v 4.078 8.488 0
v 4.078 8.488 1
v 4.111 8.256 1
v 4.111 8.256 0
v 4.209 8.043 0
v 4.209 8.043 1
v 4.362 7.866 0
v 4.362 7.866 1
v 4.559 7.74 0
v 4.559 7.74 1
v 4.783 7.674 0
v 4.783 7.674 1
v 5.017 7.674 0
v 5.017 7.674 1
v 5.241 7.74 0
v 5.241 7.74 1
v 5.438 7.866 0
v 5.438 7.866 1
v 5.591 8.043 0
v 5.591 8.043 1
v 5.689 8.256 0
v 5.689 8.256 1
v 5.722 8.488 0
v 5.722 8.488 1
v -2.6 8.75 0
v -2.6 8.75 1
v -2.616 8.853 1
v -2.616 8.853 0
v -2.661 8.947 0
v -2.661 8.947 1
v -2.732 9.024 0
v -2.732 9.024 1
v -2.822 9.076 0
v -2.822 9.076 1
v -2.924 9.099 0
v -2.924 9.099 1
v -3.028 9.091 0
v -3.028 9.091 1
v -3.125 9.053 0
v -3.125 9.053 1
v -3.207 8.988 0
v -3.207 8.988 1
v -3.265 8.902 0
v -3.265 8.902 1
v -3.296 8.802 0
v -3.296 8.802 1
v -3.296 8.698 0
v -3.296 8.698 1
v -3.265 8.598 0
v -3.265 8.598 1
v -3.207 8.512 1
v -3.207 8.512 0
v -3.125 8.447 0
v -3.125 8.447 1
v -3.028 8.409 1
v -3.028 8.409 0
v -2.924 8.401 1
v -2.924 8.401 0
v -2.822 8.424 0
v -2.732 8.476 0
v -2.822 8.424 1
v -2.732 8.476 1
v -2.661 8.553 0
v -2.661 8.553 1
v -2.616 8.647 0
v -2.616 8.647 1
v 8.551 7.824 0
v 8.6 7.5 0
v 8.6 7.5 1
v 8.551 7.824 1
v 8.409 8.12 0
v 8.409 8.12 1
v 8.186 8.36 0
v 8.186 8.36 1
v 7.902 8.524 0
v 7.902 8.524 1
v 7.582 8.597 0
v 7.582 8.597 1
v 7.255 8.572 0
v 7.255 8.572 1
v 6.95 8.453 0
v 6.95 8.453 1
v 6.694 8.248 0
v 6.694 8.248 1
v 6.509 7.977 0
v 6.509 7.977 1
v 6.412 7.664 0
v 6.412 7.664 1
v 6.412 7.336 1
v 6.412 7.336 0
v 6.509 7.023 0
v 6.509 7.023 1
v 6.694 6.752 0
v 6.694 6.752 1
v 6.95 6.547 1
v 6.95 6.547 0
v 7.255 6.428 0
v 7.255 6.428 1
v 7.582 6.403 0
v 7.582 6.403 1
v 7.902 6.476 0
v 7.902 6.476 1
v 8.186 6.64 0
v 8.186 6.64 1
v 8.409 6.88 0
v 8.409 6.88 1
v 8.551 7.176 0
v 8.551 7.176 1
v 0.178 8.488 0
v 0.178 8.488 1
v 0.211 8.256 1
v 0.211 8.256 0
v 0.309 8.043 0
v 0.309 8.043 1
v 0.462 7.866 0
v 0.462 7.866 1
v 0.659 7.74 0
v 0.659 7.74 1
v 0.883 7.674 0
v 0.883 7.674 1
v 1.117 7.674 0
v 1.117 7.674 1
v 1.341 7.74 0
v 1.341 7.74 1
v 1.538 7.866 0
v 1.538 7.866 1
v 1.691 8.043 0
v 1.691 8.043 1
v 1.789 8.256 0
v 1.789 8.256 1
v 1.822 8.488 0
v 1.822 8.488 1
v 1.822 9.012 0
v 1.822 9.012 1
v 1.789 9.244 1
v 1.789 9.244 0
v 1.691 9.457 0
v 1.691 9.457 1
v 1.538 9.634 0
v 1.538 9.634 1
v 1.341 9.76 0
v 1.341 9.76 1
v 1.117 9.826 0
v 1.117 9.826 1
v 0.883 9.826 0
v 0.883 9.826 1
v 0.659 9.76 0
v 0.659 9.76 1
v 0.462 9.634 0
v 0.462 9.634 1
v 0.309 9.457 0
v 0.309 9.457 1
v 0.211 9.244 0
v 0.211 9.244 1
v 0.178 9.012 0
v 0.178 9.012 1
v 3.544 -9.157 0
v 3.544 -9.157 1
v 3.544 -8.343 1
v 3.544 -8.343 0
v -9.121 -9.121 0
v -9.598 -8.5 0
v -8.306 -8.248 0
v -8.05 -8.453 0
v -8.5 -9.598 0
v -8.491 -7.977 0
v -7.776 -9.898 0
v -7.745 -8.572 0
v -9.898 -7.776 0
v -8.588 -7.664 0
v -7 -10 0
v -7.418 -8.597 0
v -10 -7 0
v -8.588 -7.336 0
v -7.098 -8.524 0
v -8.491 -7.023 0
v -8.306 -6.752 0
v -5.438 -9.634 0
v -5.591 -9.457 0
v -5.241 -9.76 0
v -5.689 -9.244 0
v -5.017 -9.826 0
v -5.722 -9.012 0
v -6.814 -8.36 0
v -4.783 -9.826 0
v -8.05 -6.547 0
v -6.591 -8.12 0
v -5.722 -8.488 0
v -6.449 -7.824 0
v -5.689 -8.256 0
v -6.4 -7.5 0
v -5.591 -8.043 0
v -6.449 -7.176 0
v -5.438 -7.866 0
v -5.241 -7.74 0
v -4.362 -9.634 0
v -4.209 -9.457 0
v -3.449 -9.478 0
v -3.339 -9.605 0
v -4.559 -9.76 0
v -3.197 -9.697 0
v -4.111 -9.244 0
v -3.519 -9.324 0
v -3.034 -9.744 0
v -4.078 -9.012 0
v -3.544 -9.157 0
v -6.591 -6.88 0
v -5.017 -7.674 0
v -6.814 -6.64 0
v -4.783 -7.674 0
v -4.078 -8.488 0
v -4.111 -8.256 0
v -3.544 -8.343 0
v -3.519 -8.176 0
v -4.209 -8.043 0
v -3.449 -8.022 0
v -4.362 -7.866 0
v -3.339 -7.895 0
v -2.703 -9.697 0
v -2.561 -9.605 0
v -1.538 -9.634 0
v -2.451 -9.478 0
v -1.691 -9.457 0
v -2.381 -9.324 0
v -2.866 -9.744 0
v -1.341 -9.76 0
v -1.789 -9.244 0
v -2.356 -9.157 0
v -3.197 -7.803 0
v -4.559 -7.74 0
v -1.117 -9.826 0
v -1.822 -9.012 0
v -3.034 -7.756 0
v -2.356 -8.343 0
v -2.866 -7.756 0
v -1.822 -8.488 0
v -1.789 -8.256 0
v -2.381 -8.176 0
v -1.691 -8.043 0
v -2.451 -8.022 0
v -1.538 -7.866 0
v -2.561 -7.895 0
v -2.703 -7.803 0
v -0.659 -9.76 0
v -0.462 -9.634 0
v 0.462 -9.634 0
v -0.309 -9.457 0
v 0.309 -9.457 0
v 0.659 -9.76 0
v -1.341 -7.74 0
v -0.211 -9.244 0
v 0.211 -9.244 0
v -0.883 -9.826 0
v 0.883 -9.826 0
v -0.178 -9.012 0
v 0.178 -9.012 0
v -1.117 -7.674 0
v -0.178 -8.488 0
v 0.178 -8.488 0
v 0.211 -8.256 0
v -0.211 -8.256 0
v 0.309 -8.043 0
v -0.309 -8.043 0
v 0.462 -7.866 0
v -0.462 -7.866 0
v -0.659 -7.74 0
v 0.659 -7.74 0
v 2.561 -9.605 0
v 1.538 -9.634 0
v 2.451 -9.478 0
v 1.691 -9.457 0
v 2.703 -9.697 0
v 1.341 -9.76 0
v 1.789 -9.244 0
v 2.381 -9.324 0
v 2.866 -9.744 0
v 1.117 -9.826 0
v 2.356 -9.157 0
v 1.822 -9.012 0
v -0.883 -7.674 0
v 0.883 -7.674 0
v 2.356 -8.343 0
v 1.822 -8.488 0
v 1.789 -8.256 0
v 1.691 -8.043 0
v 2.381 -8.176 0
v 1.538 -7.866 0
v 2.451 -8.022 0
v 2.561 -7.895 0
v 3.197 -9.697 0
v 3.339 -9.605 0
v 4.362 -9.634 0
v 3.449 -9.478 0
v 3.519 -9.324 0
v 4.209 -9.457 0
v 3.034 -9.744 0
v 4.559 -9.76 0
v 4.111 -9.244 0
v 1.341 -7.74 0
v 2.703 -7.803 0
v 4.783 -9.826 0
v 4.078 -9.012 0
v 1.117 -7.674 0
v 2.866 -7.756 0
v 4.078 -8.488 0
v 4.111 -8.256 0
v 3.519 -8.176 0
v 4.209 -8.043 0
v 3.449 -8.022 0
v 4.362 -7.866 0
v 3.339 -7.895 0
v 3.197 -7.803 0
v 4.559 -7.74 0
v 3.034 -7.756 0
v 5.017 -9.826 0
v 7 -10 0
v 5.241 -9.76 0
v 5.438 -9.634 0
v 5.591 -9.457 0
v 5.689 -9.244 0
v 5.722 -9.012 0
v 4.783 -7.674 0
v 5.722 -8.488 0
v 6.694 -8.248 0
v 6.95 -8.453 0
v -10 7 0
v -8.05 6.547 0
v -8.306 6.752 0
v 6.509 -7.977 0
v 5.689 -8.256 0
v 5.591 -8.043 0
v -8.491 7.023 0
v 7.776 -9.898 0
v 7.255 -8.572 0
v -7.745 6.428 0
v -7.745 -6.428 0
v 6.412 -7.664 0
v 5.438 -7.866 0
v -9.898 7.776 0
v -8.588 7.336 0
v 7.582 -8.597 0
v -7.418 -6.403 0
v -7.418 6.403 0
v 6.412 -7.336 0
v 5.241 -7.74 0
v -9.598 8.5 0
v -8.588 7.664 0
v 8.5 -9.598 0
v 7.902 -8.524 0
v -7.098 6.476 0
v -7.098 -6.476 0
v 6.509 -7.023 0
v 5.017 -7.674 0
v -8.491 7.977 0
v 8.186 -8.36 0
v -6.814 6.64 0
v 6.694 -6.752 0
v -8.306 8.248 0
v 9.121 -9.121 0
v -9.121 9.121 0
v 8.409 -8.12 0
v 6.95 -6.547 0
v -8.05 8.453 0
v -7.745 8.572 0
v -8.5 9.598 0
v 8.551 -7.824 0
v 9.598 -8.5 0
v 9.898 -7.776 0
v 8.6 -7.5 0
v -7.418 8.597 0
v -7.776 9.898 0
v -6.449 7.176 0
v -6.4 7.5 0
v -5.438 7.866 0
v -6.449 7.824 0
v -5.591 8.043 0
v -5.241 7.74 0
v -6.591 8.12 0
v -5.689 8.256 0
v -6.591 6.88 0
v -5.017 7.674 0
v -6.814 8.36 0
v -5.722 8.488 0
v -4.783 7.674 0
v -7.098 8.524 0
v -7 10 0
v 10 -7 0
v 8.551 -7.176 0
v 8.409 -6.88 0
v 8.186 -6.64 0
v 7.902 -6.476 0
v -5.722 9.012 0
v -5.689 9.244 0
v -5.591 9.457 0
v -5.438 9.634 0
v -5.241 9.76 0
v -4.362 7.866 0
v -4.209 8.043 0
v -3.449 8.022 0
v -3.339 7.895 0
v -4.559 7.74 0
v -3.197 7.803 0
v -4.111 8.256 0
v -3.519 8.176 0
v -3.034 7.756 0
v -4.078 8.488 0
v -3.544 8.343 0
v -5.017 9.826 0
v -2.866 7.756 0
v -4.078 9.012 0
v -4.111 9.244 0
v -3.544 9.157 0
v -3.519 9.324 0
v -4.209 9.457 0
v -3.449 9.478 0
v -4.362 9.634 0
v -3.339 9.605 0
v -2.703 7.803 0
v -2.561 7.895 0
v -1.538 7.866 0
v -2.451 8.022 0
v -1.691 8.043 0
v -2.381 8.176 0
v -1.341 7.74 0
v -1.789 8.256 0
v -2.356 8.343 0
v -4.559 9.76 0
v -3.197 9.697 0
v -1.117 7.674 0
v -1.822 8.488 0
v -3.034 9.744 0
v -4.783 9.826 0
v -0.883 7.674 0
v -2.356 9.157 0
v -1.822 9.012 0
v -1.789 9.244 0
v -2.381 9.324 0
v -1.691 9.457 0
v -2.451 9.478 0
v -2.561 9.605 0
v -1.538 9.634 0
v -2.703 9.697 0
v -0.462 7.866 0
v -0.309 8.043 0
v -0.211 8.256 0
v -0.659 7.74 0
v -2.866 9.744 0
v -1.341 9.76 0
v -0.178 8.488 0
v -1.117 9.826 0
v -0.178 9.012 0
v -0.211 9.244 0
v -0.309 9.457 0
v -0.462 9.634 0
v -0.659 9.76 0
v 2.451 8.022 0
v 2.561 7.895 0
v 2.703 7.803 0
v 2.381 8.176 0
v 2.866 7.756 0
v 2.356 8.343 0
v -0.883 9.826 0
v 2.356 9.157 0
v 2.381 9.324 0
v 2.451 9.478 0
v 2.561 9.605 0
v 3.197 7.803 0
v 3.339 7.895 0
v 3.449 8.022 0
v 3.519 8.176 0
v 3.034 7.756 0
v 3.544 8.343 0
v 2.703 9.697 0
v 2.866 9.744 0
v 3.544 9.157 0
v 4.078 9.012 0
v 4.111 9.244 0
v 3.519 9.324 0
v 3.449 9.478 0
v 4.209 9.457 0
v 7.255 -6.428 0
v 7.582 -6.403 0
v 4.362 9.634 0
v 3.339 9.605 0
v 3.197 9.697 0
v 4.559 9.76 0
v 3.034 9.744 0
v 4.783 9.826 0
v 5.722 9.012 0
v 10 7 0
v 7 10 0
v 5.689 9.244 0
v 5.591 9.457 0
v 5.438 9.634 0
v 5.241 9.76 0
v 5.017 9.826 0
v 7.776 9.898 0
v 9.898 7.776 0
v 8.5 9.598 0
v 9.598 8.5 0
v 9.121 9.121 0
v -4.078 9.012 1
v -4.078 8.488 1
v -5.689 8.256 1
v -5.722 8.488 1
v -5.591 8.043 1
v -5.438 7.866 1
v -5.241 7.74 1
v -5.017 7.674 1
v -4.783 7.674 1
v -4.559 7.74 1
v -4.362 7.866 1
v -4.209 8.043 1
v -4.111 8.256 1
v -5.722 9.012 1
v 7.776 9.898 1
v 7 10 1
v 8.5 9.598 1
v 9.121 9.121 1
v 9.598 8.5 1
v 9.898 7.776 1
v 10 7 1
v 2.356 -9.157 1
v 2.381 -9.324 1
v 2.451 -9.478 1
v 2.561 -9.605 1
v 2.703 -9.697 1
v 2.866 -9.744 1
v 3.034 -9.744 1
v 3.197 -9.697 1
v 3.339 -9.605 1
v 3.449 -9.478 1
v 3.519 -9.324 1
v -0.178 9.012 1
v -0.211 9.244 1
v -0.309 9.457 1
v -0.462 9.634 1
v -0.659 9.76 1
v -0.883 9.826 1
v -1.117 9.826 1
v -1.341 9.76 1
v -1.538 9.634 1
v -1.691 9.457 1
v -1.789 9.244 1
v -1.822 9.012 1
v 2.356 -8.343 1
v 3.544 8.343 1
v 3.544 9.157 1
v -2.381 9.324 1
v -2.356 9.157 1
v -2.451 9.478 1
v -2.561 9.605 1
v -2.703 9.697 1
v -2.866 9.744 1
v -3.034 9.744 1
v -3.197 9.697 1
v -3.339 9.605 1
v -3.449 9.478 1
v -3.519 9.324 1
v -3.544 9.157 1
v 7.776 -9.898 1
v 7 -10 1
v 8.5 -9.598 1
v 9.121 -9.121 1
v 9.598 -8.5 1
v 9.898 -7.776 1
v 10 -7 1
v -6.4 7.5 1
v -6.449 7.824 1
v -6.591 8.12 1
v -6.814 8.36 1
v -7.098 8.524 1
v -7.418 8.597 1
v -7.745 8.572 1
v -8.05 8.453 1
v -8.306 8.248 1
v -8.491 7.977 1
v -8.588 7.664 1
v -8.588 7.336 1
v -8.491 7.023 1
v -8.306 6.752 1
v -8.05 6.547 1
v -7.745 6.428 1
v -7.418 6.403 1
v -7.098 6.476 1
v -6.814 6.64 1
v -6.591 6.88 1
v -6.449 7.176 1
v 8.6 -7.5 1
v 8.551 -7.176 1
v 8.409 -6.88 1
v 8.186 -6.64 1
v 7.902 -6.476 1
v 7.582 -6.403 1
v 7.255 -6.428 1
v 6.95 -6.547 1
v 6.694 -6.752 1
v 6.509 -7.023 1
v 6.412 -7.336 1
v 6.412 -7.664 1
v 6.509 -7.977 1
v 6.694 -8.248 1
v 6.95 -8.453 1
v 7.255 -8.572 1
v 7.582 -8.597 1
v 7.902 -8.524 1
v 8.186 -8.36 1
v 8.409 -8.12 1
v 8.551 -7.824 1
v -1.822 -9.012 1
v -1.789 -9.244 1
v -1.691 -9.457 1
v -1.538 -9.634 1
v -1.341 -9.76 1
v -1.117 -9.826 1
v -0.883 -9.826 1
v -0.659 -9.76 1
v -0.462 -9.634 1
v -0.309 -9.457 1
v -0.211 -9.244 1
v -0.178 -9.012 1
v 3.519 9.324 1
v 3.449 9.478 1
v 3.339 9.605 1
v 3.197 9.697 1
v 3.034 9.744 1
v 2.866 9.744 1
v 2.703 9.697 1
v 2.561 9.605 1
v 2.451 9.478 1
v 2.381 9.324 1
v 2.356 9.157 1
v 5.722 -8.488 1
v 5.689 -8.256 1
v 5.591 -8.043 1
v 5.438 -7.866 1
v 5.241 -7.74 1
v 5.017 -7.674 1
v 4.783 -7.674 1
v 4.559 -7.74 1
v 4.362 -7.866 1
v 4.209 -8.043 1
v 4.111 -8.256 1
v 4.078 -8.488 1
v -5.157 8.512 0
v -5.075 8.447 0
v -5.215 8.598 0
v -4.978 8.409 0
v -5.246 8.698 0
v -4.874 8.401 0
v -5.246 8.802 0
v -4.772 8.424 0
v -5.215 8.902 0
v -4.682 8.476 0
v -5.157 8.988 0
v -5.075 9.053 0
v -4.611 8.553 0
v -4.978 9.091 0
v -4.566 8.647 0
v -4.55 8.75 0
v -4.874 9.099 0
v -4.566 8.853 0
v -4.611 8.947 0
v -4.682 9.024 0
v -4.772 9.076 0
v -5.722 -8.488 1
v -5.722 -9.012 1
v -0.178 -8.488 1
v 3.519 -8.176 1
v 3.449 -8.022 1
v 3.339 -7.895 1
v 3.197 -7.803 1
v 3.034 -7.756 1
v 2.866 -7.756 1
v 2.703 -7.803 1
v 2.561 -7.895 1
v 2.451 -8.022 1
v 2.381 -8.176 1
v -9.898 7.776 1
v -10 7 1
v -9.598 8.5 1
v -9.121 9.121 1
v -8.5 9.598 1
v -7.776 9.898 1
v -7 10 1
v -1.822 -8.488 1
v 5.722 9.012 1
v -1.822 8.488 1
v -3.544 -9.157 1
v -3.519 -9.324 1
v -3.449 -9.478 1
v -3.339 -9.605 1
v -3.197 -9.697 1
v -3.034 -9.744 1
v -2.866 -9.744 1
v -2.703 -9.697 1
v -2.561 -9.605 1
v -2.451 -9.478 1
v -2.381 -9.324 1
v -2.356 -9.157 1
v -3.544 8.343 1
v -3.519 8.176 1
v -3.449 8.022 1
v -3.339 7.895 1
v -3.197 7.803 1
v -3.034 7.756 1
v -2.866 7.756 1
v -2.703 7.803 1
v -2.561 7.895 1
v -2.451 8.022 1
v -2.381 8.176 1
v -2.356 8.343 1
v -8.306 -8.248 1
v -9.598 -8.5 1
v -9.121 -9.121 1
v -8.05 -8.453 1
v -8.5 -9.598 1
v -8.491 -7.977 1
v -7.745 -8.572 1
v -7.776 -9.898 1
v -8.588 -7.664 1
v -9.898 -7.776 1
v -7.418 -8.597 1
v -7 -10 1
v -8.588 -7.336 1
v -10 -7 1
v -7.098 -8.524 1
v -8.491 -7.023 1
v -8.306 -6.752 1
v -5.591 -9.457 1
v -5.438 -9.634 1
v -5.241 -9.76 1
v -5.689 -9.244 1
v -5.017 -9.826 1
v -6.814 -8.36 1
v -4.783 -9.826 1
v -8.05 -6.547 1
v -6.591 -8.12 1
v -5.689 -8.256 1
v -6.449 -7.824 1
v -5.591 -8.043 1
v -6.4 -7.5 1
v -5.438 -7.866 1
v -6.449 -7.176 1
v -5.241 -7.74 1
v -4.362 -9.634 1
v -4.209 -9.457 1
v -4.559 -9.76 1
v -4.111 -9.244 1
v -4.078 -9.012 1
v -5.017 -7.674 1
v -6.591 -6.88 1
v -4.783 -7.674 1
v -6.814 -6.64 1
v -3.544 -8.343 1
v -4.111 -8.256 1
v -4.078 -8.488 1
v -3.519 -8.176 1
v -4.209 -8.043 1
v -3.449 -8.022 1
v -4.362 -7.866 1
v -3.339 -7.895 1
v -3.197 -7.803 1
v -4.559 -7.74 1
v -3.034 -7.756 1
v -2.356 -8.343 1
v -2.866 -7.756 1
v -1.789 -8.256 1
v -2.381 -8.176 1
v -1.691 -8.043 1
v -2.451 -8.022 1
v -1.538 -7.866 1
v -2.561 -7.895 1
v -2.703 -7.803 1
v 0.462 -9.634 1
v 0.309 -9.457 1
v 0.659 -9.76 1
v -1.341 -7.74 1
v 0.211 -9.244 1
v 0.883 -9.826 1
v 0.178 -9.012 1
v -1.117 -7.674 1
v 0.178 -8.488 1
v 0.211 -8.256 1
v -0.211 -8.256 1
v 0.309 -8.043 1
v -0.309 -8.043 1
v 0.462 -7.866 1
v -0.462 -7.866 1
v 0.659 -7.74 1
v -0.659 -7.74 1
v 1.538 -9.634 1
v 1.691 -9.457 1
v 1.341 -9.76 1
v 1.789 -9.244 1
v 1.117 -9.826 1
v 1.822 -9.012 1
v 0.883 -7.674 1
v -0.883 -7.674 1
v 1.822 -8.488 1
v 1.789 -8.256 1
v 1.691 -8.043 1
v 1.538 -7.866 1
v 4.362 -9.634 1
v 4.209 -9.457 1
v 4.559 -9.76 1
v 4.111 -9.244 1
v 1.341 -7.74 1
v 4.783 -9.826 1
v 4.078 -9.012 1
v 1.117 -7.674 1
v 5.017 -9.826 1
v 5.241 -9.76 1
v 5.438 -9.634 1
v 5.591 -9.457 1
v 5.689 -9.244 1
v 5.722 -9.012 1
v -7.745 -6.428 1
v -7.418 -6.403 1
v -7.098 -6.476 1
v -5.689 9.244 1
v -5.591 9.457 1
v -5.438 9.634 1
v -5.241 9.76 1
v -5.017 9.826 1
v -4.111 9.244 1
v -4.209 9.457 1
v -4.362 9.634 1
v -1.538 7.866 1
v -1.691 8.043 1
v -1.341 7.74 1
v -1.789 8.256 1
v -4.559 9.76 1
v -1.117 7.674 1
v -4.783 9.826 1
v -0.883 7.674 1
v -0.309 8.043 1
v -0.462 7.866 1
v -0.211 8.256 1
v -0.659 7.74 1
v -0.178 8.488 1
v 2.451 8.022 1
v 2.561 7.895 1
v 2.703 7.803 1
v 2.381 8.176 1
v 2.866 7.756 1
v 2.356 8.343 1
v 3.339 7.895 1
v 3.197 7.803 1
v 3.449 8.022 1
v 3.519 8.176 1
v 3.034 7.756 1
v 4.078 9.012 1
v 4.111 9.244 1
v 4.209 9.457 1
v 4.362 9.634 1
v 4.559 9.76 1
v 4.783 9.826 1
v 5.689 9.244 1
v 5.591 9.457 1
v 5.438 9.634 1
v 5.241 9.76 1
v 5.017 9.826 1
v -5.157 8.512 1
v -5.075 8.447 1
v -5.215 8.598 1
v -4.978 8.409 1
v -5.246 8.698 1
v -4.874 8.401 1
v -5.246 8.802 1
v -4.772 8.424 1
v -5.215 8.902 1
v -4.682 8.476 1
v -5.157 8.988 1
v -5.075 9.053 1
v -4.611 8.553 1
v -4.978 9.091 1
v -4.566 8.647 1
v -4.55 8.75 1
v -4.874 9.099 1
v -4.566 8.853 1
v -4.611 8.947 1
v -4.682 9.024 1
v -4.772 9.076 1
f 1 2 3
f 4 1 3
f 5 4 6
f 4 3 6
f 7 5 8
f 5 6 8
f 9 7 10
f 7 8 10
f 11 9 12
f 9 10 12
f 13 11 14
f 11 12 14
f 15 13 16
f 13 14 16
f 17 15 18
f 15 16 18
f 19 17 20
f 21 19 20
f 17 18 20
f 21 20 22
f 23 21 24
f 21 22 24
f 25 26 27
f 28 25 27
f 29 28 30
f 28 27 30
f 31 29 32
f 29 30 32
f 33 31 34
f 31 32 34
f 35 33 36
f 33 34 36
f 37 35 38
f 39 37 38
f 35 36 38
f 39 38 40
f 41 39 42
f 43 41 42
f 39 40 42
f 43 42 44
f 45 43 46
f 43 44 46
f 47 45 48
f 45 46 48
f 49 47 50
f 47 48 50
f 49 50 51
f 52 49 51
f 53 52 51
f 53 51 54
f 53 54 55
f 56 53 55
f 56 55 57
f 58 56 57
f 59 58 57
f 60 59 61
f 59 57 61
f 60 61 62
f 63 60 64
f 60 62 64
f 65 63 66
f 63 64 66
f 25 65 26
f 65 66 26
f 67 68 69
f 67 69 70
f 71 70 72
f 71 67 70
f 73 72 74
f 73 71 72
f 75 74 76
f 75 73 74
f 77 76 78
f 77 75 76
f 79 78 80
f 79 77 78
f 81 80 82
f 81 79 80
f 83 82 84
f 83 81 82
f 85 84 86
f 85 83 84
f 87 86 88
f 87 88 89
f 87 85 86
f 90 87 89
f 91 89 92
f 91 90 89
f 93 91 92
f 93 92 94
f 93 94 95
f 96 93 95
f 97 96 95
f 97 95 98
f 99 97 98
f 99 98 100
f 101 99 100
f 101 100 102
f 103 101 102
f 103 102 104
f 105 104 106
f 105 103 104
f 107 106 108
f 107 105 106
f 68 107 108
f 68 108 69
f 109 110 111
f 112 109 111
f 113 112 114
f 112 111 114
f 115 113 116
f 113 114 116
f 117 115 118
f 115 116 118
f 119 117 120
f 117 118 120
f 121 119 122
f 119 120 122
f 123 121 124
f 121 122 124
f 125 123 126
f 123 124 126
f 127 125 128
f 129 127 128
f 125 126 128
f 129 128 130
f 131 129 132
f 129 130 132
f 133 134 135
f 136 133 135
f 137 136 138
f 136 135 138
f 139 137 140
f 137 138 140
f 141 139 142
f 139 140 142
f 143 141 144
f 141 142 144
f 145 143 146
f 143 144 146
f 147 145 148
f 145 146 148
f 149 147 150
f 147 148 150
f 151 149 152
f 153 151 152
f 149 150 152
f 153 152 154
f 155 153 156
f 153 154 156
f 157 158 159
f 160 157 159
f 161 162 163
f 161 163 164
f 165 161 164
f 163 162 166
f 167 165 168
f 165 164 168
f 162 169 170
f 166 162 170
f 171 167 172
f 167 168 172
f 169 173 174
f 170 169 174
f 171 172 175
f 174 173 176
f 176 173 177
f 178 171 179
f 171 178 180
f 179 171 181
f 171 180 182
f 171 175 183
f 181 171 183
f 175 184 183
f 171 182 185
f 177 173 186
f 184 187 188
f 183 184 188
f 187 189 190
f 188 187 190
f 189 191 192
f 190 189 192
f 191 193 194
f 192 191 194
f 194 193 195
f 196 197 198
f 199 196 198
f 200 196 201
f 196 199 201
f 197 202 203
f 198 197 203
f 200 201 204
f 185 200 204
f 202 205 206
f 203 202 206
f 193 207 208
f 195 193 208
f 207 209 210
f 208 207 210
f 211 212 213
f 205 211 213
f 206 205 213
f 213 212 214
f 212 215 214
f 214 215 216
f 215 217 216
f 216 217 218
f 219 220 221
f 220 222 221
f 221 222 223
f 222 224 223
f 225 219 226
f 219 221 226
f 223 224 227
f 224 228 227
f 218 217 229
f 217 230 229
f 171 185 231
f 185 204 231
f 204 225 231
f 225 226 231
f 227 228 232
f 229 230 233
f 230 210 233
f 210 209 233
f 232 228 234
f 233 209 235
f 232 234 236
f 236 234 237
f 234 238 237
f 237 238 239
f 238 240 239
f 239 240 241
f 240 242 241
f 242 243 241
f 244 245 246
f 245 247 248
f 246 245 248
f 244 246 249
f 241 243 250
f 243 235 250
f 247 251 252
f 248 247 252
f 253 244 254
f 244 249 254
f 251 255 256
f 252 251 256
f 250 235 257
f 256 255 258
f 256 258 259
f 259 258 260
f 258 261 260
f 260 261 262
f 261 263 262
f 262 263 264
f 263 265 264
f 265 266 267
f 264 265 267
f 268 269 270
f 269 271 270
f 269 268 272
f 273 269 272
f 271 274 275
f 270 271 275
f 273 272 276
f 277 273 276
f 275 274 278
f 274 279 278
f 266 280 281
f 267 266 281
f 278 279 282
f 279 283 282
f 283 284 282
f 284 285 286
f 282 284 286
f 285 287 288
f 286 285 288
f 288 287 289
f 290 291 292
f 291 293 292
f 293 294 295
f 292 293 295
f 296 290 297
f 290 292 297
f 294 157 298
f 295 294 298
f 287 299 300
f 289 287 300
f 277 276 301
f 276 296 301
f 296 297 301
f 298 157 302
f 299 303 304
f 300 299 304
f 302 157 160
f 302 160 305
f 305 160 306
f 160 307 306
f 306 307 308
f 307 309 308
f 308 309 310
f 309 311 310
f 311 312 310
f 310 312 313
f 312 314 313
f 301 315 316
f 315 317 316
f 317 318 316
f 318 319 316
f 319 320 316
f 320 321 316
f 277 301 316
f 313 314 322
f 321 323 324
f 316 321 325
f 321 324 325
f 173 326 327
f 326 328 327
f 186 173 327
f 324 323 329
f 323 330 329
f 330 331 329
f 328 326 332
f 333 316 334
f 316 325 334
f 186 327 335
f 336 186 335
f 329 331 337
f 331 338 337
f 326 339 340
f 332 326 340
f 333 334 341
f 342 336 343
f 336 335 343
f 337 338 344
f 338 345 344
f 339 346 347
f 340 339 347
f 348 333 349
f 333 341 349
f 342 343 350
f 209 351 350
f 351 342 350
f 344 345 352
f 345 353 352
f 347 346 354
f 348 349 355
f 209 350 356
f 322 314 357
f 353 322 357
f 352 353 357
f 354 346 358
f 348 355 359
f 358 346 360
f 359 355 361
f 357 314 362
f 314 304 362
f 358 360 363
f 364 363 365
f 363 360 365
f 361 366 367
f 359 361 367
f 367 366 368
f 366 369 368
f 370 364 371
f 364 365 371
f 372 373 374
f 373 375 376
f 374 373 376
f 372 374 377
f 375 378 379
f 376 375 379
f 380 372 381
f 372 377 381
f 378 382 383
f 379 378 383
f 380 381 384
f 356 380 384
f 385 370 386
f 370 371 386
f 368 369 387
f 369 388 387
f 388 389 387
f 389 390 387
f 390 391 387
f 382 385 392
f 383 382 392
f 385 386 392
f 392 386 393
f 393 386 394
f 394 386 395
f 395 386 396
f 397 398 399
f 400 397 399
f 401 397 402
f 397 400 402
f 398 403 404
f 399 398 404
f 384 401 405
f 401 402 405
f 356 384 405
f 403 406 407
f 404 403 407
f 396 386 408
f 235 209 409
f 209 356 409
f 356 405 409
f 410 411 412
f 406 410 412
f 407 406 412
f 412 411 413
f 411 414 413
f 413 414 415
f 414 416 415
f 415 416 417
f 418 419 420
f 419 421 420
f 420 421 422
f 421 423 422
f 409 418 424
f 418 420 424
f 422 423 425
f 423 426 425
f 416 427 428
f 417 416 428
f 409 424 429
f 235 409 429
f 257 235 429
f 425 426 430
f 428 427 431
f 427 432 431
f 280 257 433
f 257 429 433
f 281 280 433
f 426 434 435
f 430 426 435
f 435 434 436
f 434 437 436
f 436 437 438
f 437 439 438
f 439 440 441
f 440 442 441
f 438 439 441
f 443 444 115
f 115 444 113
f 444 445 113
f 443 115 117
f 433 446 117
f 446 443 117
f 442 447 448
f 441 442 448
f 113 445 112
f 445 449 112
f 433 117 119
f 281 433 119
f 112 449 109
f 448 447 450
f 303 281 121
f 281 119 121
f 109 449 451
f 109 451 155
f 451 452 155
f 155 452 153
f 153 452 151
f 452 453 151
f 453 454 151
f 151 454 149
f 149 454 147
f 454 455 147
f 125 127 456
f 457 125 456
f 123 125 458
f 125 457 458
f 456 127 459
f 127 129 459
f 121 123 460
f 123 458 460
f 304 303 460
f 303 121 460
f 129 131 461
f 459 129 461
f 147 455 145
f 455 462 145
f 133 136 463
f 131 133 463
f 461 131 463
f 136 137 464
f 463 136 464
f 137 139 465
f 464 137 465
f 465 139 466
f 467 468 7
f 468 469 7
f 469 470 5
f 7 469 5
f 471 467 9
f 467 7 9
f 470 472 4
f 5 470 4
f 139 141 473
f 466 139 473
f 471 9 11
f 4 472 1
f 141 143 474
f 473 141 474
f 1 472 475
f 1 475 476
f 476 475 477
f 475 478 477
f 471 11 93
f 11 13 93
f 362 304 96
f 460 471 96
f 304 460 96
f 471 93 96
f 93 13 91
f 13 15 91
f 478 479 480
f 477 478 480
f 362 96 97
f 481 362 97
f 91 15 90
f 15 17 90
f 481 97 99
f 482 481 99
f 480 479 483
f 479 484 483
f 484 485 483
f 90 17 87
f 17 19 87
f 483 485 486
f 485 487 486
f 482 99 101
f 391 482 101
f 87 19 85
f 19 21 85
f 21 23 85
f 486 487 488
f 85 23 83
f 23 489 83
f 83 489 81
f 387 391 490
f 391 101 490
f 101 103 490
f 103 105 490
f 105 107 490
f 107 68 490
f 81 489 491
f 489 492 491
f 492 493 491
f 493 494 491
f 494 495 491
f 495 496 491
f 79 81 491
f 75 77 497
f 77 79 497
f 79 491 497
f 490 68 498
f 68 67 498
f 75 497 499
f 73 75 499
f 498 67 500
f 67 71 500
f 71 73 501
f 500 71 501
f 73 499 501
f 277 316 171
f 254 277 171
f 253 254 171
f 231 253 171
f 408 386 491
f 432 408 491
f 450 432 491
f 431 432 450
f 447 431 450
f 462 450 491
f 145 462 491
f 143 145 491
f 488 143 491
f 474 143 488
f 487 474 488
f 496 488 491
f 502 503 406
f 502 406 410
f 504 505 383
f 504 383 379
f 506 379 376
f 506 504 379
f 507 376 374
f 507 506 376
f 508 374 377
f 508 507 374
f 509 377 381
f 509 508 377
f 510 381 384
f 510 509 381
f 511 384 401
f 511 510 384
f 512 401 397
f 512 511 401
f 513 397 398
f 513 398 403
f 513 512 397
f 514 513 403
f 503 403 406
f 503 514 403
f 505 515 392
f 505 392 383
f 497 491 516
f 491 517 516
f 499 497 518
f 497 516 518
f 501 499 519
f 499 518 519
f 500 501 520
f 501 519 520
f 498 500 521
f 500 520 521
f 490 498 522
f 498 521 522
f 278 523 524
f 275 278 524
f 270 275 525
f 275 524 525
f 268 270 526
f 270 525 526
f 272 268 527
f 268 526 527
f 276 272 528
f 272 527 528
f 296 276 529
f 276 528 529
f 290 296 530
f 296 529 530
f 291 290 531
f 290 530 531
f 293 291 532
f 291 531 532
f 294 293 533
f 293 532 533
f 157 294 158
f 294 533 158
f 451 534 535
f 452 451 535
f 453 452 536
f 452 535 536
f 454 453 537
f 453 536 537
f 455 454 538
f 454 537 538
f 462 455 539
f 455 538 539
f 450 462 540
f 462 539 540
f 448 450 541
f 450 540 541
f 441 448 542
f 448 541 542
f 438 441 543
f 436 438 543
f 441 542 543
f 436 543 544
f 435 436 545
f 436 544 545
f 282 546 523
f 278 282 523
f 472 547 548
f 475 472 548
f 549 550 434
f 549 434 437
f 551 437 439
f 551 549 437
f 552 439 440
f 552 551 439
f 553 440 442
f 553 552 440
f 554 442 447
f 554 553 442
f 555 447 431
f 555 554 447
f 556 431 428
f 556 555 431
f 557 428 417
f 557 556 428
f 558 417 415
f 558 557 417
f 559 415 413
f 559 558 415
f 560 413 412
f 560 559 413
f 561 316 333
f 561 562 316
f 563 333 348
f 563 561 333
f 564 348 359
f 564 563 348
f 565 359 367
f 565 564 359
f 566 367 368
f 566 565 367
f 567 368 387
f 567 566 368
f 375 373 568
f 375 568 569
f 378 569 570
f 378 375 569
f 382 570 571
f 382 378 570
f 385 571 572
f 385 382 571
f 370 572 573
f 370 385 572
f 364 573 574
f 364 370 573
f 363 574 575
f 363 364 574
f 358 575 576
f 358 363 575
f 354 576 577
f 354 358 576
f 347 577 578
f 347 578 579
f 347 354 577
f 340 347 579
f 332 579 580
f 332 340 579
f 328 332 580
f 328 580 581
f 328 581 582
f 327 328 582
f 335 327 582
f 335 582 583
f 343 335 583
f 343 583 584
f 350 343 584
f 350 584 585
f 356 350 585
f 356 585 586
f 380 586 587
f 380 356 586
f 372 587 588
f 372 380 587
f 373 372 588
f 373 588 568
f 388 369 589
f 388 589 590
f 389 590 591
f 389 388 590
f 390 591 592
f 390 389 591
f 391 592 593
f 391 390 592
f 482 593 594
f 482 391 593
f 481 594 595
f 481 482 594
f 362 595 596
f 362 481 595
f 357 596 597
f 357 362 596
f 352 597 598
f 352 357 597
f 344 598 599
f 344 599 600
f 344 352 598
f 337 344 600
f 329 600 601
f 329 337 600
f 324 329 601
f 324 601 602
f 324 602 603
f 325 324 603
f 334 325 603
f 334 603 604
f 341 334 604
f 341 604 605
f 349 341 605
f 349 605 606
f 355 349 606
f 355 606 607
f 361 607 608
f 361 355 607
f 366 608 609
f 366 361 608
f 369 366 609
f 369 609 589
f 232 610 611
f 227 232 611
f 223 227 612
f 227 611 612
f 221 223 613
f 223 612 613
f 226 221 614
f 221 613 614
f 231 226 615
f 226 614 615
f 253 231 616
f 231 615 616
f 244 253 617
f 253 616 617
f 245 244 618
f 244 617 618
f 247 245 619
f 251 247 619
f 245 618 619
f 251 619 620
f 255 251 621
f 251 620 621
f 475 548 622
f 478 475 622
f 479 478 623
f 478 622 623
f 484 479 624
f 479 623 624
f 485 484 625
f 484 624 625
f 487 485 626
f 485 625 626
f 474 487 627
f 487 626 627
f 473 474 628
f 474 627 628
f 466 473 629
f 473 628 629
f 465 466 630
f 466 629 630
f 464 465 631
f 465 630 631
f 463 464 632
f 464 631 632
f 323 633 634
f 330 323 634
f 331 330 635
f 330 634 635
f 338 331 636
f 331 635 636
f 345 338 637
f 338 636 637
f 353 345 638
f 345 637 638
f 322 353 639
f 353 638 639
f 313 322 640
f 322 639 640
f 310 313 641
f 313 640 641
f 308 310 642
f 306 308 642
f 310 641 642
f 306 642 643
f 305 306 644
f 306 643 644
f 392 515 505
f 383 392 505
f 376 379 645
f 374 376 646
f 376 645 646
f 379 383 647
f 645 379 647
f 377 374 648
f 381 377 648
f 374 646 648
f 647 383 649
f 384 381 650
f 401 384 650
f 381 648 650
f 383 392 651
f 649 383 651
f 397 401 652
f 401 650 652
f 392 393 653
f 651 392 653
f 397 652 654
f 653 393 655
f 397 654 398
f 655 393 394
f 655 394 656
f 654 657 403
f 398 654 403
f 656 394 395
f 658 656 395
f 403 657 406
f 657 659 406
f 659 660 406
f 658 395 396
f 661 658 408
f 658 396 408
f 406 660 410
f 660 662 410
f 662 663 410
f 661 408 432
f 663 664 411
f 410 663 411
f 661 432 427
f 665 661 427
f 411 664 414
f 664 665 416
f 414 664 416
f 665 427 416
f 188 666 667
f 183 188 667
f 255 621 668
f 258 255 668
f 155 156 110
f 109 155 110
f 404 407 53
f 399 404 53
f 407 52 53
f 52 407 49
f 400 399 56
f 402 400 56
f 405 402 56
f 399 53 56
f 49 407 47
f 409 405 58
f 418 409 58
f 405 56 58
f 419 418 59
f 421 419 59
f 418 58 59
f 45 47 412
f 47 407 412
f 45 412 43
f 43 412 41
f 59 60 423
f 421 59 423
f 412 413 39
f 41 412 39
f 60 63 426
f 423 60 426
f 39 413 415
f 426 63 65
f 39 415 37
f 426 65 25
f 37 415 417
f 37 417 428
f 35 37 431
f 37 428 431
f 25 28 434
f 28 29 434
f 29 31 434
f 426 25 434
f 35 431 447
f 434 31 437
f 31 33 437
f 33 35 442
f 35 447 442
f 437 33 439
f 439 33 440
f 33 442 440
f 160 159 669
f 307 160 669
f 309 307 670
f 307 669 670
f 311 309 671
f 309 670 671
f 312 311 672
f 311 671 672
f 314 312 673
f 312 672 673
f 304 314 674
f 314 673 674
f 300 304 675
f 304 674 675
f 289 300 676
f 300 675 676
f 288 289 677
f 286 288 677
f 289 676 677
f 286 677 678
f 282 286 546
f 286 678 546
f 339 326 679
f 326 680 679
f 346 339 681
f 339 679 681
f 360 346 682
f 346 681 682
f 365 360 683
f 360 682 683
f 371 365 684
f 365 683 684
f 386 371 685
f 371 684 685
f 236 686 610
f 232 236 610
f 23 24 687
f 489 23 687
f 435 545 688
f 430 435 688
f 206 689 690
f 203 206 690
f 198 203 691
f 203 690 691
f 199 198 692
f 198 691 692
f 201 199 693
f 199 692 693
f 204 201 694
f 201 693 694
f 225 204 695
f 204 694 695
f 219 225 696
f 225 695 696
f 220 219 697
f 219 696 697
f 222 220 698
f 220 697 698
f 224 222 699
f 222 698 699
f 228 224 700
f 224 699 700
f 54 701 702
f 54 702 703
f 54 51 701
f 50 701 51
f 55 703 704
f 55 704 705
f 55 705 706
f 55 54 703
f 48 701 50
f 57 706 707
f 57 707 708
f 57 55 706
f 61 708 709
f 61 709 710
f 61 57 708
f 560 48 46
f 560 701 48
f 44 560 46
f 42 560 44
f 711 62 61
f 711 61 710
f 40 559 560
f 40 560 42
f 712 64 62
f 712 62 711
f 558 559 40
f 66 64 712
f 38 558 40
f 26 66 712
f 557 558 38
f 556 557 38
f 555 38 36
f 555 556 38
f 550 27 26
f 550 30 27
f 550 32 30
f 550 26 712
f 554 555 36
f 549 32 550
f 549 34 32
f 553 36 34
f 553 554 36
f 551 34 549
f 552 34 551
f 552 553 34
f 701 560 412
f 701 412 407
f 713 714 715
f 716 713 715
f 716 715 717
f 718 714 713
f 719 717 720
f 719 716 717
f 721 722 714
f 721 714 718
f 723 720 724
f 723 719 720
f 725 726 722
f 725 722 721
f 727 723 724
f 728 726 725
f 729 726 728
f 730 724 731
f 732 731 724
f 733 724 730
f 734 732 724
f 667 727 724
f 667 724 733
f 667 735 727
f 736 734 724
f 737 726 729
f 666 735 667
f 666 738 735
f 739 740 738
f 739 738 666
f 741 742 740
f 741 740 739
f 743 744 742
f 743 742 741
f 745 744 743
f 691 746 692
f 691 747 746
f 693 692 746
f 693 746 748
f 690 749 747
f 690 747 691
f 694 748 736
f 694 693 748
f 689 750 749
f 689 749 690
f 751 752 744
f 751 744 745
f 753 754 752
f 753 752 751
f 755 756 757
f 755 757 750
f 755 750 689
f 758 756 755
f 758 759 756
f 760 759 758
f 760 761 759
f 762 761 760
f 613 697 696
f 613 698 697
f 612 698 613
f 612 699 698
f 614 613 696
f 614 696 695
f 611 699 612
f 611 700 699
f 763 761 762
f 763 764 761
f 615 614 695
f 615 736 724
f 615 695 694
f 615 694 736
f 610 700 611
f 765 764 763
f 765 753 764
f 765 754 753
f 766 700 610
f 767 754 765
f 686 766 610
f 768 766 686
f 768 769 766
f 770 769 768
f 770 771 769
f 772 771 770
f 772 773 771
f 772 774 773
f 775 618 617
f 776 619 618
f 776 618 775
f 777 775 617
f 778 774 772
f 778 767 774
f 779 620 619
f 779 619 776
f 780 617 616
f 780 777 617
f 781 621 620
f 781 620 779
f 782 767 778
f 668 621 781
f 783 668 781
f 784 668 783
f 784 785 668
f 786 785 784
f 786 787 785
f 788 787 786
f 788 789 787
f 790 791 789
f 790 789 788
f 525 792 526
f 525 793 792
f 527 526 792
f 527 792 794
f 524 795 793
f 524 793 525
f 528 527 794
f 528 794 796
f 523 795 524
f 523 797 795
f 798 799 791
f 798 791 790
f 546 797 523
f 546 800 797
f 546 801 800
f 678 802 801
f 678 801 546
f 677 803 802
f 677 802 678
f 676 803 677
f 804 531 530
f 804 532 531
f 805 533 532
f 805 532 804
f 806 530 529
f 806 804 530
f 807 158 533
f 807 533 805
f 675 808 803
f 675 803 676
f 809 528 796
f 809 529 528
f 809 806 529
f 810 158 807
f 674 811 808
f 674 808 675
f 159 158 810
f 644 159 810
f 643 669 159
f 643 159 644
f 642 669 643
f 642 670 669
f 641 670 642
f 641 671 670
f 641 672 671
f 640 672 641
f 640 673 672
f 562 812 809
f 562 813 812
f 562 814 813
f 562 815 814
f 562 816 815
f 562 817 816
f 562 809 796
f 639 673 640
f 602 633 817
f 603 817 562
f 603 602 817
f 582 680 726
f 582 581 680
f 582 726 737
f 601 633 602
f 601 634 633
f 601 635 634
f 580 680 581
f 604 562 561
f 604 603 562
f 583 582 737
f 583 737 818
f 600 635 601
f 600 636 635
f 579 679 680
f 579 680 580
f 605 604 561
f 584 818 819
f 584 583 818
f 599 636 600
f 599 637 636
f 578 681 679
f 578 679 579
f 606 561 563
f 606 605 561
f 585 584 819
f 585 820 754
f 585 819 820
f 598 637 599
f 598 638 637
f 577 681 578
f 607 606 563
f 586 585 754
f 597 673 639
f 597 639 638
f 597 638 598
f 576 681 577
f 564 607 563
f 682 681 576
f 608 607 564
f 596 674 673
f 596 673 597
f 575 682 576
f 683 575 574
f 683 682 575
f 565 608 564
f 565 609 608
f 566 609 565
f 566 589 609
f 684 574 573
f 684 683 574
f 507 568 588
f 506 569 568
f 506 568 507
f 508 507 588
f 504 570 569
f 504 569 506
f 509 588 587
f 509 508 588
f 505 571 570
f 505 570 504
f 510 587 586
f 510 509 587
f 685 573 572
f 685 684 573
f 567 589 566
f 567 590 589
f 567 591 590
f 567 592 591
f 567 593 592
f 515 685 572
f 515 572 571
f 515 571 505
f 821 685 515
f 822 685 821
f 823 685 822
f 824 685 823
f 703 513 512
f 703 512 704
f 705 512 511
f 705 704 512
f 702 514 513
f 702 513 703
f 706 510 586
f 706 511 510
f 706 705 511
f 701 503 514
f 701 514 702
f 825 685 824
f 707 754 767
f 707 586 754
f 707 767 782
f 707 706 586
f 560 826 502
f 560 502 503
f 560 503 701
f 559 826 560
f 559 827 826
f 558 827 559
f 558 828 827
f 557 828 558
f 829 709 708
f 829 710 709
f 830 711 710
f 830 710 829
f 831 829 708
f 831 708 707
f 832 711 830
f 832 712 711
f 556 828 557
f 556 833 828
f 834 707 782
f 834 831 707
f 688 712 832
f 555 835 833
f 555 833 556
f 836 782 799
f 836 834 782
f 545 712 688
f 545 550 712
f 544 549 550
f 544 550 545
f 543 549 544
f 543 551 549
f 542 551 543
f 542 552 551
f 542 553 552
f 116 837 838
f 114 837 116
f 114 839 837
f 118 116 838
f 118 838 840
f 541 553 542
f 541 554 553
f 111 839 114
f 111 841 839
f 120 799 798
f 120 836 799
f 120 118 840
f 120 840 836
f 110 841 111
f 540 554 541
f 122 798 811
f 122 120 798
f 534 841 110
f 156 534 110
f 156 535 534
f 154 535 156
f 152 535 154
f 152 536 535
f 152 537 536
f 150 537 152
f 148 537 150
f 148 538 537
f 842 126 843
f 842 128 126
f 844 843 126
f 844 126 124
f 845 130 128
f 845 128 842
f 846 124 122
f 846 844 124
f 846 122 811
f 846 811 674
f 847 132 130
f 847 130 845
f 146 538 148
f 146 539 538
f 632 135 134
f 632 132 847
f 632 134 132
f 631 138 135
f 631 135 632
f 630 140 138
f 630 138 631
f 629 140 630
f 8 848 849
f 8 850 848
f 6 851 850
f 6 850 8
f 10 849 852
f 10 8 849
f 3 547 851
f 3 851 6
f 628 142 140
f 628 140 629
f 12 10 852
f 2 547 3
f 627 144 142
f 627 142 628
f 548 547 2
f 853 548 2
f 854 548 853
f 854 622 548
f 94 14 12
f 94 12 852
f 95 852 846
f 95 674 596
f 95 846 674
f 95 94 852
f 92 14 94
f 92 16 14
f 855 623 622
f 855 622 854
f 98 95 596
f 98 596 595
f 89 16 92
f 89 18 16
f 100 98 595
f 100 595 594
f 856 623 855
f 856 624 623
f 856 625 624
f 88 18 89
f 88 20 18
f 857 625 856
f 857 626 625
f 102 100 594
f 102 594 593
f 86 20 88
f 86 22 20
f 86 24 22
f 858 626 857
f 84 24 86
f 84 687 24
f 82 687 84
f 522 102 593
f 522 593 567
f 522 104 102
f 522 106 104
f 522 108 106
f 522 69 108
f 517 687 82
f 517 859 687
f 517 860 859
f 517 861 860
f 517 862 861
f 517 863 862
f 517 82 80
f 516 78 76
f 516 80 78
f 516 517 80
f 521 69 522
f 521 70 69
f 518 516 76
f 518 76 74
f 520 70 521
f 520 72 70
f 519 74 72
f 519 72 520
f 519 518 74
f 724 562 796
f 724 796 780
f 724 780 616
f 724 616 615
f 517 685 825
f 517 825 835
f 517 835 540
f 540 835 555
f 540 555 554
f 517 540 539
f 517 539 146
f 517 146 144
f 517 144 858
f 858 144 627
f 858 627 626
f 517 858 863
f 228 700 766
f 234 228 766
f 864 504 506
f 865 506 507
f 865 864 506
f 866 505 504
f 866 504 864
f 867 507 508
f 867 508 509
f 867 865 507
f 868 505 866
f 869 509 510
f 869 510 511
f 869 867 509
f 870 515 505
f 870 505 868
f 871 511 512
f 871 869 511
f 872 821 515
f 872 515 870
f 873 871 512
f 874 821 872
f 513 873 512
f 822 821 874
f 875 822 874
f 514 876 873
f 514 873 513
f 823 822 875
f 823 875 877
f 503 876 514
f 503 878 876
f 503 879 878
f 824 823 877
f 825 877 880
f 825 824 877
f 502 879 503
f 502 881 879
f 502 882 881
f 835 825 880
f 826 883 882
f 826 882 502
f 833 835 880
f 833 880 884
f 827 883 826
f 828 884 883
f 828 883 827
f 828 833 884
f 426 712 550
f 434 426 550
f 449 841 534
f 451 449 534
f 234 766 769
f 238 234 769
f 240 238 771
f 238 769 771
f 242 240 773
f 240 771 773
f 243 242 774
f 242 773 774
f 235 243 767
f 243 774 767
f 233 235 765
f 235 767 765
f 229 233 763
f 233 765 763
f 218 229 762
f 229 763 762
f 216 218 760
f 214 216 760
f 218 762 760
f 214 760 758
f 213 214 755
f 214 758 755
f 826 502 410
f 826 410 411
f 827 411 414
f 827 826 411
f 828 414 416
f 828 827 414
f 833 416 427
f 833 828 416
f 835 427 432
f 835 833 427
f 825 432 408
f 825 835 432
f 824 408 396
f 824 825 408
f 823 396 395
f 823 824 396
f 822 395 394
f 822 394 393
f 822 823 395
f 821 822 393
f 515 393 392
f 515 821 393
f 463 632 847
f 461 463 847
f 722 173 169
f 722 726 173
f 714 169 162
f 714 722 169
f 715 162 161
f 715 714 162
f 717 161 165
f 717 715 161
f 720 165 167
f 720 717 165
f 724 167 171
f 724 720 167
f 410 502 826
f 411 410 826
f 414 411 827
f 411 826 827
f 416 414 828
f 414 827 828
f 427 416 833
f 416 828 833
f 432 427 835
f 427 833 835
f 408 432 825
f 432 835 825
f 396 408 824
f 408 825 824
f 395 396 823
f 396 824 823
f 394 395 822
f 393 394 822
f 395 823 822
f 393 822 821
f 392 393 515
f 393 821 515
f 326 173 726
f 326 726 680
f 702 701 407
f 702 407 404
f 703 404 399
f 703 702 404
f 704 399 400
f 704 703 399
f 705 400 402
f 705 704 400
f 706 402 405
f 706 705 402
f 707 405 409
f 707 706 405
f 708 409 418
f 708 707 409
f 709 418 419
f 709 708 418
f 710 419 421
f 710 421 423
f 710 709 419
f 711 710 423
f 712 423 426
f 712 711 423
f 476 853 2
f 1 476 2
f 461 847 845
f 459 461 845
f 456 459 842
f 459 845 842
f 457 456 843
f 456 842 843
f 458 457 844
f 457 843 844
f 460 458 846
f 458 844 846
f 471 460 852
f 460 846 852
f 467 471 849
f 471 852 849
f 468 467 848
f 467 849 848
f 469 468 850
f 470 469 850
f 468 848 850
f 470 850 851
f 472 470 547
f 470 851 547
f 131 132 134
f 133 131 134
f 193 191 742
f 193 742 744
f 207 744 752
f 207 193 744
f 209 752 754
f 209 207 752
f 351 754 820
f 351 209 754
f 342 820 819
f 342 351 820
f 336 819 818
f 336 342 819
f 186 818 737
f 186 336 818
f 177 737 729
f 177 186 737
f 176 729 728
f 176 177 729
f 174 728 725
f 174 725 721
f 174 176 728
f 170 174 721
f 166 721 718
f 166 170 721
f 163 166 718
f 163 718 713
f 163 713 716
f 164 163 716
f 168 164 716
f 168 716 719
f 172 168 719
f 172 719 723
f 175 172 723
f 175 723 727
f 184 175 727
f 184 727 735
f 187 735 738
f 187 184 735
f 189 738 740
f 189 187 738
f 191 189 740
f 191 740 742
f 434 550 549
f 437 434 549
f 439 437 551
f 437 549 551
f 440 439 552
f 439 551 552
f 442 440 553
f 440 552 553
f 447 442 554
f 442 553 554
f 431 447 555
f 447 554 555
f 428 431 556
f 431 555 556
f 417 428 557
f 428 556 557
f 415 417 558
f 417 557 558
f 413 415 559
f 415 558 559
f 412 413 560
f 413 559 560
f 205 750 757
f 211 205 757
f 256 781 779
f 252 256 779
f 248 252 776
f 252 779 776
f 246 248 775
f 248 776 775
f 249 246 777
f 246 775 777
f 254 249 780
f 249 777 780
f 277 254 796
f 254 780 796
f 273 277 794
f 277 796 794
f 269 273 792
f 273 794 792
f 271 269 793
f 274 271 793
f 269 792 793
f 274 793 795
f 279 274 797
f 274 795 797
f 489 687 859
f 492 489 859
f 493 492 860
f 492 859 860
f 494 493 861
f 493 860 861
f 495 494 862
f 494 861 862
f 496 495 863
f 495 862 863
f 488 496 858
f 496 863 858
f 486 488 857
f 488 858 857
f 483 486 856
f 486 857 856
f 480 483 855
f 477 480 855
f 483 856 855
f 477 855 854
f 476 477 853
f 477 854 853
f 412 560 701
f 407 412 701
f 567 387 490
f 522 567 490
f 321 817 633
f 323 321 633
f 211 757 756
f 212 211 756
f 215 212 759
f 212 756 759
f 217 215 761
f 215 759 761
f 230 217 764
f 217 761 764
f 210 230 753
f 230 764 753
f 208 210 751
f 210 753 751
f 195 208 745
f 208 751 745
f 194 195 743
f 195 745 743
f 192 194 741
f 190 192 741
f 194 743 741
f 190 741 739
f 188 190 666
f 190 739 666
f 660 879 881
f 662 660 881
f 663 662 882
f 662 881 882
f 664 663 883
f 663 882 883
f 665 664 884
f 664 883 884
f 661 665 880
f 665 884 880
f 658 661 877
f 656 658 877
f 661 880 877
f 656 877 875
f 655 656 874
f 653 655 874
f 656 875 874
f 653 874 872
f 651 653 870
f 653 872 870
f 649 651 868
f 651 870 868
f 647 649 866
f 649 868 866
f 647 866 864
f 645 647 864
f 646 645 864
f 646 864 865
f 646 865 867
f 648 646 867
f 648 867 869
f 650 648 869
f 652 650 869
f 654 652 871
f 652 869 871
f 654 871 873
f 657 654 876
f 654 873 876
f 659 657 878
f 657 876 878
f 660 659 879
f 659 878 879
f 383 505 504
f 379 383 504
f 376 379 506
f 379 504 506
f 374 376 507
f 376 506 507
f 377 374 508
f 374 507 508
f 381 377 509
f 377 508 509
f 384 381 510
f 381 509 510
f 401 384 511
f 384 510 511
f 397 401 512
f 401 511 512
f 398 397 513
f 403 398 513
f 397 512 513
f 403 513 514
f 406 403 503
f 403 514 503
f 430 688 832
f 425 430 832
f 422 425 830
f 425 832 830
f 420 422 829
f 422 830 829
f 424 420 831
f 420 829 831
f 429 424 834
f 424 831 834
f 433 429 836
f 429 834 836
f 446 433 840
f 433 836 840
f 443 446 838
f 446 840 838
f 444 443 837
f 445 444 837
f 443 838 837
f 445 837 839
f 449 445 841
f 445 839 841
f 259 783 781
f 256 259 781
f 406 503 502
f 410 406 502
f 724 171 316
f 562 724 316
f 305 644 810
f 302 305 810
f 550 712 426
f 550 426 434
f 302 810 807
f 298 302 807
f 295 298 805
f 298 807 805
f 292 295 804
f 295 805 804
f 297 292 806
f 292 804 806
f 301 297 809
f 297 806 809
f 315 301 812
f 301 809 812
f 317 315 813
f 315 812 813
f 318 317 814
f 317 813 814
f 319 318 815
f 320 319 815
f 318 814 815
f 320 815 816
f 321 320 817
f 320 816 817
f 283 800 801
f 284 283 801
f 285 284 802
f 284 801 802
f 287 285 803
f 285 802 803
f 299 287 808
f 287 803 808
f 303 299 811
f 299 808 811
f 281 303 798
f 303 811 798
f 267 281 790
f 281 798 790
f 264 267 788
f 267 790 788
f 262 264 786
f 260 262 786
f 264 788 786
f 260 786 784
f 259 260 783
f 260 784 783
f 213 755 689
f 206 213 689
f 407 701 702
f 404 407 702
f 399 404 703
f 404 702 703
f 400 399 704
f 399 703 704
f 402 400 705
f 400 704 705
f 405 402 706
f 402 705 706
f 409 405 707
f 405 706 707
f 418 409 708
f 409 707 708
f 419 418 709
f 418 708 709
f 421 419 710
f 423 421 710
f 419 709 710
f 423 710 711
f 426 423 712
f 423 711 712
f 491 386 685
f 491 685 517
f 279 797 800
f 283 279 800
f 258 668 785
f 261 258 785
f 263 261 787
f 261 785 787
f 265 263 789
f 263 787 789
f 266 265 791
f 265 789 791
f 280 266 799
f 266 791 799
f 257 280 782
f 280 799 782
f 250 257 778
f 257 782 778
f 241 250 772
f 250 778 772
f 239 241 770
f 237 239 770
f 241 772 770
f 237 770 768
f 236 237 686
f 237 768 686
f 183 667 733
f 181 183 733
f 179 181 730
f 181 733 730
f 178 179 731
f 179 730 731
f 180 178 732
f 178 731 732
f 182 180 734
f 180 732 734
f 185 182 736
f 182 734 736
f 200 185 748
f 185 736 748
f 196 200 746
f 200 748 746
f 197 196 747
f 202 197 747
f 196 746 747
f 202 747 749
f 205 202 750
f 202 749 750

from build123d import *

# Parameters (mm, degrees)
F0_W     = 20
F0_H     = 20
F0_R     = 1.1
F1_DEPTH = 1
F2_R     = 3
F3_R     = 0.35
F4_DEPTH = 25
F5_DEPTH = 1


with BuildPart() as f1:
    # F0 (on Top) → F1 (new body)
    with BuildSketch(Plane.XY):
        Rectangle(F0_W, F0_H)
        with Locations((-7.5, -7.5)):
            Circle(F0_R, mode=Mode.SUBTRACT)
        with Locations((7.5, -7.5)):
            Circle(F0_R, mode=Mode.SUBTRACT)
        with Locations((-7.5, 7.5)):
            Circle(F0_R, mode=Mode.SUBTRACT)
        with Locations((7.5, 7.5)):
            Circle(F0_R, mode=Mode.SUBTRACT)
    extrude(amount=F1_DEPTH)

    # F2
    f2_edges = [f1.edges().sort_by_distance(p)[0] for p in [
        (-10, -10, 0.5),
        (10, -10, 0.5),
        (10, 10, 0.5),
        (-10, 10, 0.5),
    ]]
    fillet(f2_edges, radius=F2_R)

    # F3 (on face) → F4 (cut)
    with BuildSketch(Plane.XY.offset(1)):
        with BuildLine():
            ThreePointArc((-4.0780374549, 9.0123321861), (-4.9, 9.8342947312), (-5.7219625451, 9.0123321861))
            Line((-5.7219625451, 9.0123321861), (-5.7219625451, 8.4876678139))
            ThreePointArc((-5.7219625451, 8.4876678139), (-4.9, 7.6657052688), (-4.0780374549, 8.4876678139))
            Line((-4.0780374549, 8.4876678139), (-4.0780374549, 9.0123321861))
        make_face()
        with Locations((-4.9, 8.75)):
            Circle(F3_R, mode=Mode.SUBTRACT)
        with BuildLine():
            Line((-0.1780374549, 8.4876678139), (-0.1780374549, 9.0123321861))
            ThreePointArc((-0.1780374549, 9.0123321861), (-1, 9.8342947312), (-1.8219625451, 9.0123321861))
            Line((-1.8219625451, 9.0123321861), (-1.8219625451, 8.4876678139))
            ThreePointArc((-1.8219625451, 8.4876678139), (-1, 7.6657052688), (-0.1780374549, 8.4876678139))
        make_face()
        with Locations((-1, 8.75)):
            Circle(F3_R, mode=Mode.SUBTRACT)
        with BuildLine():
            Line((0.1780374549, 9.0123321861), (0.1780374549, 8.4876678139))
            ThreePointArc((0.1780374549, 8.4876678139), (1, 7.6657052688), (1.8219625451, 8.4876678139))
            Line((1.8219625451, 8.4876678139), (1.8219625451, 9.0123321861))
            ThreePointArc((1.8219625451, 9.0123321861), (1, 9.8342947312), (0.1780374549, 9.0123321861))
        make_face()
        with Locations((1, 8.75)):
            Circle(F3_R, mode=Mode.SUBTRACT)
        with BuildLine():
            Line((5.7219625451, 8.4876678139), (5.7219625451, 9.0123321861))
            ThreePointArc((5.7219625451, 9.0123321861), (4.9, 9.8342947312), (4.0780374549, 9.0123321861))
            Line((4.0780374549, 9.0123321861), (4.0780374549, 8.4876678139))
            ThreePointArc((4.0780374549, 8.4876678139), (4.9, 7.6657052688), (5.7219625451, 8.4876678139))
        make_face()
        with Locations((4.9, 8.75)):
            Circle(F3_R, mode=Mode.SUBTRACT)
        with BuildLine():
            ThreePointArc((4.0780374549, -9.0123321861), (4.9, -9.8342947312), (5.7219625451, -9.0123321861))
            Line((5.7219625451, -9.0123321861), (5.7219625451, -8.4876678139))
            ThreePointArc((5.7219625451, -8.4876678139), (4.9, -7.6657052688), (4.0780374549, -8.4876678139))
            Line((4.0780374549, -8.4876678139), (4.0780374549, -9.0123321861))
        make_face()
        with Locations((4.9, -8.75)):
            Circle(F3_R, mode=Mode.SUBTRACT)
        with BuildLine():
            Line((1.8219625451, -9.0123321861), (1.8219625451, -8.4876678139))
            ThreePointArc((1.8219625451, -8.4876678139), (1, -7.6657052688), (0.1780374549, -8.4876678139))
            Line((0.1780374549, -8.4876678139), (0.1780374549, -9.0123321861))
            ThreePointArc((0.1780374549, -9.0123321861), (1, -9.8342947312), (1.8219625451, -9.0123321861))
        make_face()
        with Locations((1, -8.75)):
            Circle(F3_R, mode=Mode.SUBTRACT)
        with BuildLine():
            ThreePointArc((-0.1780374549, -8.4876678139), (-1, -7.6657052688), (-1.8219625451, -8.4876678139))
            Line((-1.8219625451, -8.4876678139), (-1.8219625451, -9.0123321861))
            ThreePointArc((-1.8219625451, -9.0123321861), (-1, -9.8342947312), (-0.1780374549, -9.0123321861))
            Line((-0.1780374549, -9.0123321861), (-0.1780374549, -8.4876678139))
        make_face()
        with Locations((-1, -8.75)):
            Circle(F3_R, mode=Mode.SUBTRACT)
        with BuildLine():
            Line((-5.7219625451, -8.4876678139), (-5.7219625451, -9.0123321861))
            ThreePointArc((-5.7219625451, -9.0123321861), (-4.9, -9.8342947312), (-4.0780374549, -9.0123321861))
            Line((-4.0780374549, -9.0123321861), (-4.0780374549, -8.4876678139))
            ThreePointArc((-4.0780374549, -8.4876678139), (-4.9, -7.6657052688), (-5.7219625451, -8.4876678139))
        make_face()
        with Locations((-4.9, -8.75)):
            Circle(F3_R, mode=Mode.SUBTRACT)
        with BuildLine():
            ThreePointArc((-2.3564959411, 9.1567868367), (-2.95, 9.7502908956), (-3.5435040589, 9.1567868367))
            Line((-3.5435040589, 9.1567868367), (-3.5435040589, 8.3432131633))
            ThreePointArc((-3.5435040589, 8.3432131633), (-2.95, 7.7497091044), (-2.3564959411, 8.3432131633))
            Line((-2.3564959411, 8.3432131633), (-2.3564959411, 9.1567868367))
        make_face()
        with Locations((-2.95, 8.75)):
            Circle(F3_R, mode=Mode.SUBTRACT)
        with BuildLine():
            Line((3.5435040589, 8.3432131633), (3.5435040589, 9.1567868367))
            ThreePointArc((3.5435040589, 9.1567868367), (2.95, 9.7502908956), (2.3564959411, 9.1567868367))
            Line((2.3564959411, 9.1567868367), (2.3564959411, 8.3432131633))
            ThreePointArc((2.3564959411, 8.3432131633), (2.95, 7.7497091044), (3.5435040589, 8.3432131633))
        make_face()
        with Locations((2.95, 8.75)):
            Circle(F3_R, mode=Mode.SUBTRACT)
        with BuildLine():
            ThreePointArc((2.3564959411, -9.1567868367), (2.95, -9.7502908956), (3.5435040589, -9.1567868367))
            Line((3.5435040589, -9.1567868367), (3.5435040589, -8.3432131633))
            ThreePointArc((3.5435040589, -8.3432131633), (2.95, -7.7497091044), (2.3564959411, -8.3432131633))
            Line((2.3564959411, -8.3432131633), (2.3564959411, -9.1567868367))
        make_face()
        with Locations((2.95, -8.75)):
            Circle(F3_R, mode=Mode.SUBTRACT)
        with BuildLine():
            Line((-2.3564959411, -9.1567868367), (-2.3564959411, -8.3432131633))
            ThreePointArc((-2.3564959411, -8.3432131633), (-2.95, -7.7497091044), (-3.5435040589, -8.3432131633))
            Line((-3.5435040589, -8.3432131633), (-3.5435040589, -9.1567868367))
            ThreePointArc((-3.5435040589, -9.1567868367), (-2.95, -9.7502908956), (-2.3564959411, -9.1567868367))
        make_face()
        with Locations((-2.95, -8.75)):
            Circle(F3_R, mode=Mode.SUBTRACT)
        with Locations((-4.9, 8.75)):
            Circle(F3_R)
        with Locations((-2.95, 8.75)):
            Circle(F3_R)
        with Locations((-1, 8.75)):
            Circle(F3_R)
        with Locations((1, 8.75)):
            Circle(F3_R)
        with Locations((2.95, 8.75)):
            Circle(F3_R)
        with Locations((4.9, 8.75)):
            Circle(F3_R)
        with Locations((4.9, -8.75)):
            Circle(F3_R)
        with Locations((2.95, -8.75)):
            Circle(F3_R)
        with Locations((1, -8.75)):
            Circle(F3_R)
        with Locations((-1, -8.75)):
            Circle(F3_R)
        with Locations((-2.95, -8.75)):
            Circle(F3_R)
        with Locations((-4.9, -8.75)):
            Circle(F3_R)
    extrude(amount=-F4_DEPTH, mode=Mode.SUBTRACT)


with BuildPart() as f5:
    # F3 (on face) → F5 (new body)
    with BuildSketch(Plane.XY.offset(1)):
        with BuildLine():
            ThreePointArc((-4.0780374549, 9.0123321861), (-4.9, 9.8342947312), (-5.7219625451, 9.0123321861))
            Line((-5.7219625451, 9.0123321861), (-5.7219625451, 8.4876678139))
            ThreePointArc((-5.7219625451, 8.4876678139), (-4.9, 7.6657052688), (-4.0780374549, 8.4876678139))
            Line((-4.0780374549, 8.4876678139), (-4.0780374549, 9.0123321861))
        make_face()
        with Locations((-4.9, 8.75)):
            Circle(F3_R, mode=Mode.SUBTRACT)
    extrude(amount=-F5_DEPTH)


with BuildPart() as f5b:
    # F3 (on face) → F5, piece 2 (new body)
    with BuildSketch(Plane.XY.offset(1)):
        with BuildLine():
            ThreePointArc((-2.3564959411, 9.1567868367), (-2.95, 9.7502908956), (-3.5435040589, 9.1567868367))
            Line((-3.5435040589, 9.1567868367), (-3.5435040589, 8.3432131633))
            ThreePointArc((-3.5435040589, 8.3432131633), (-2.95, 7.7497091044), (-2.3564959411, 8.3432131633))
            Line((-2.3564959411, 8.3432131633), (-2.3564959411, 9.1567868367))
        make_face()
        with Locations((-2.95, 8.75)):
            Circle(F3_R, mode=Mode.SUBTRACT)
    extrude(amount=-F5_DEPTH)


solid = Compound([f1.part, f5.part, f5b.part])
